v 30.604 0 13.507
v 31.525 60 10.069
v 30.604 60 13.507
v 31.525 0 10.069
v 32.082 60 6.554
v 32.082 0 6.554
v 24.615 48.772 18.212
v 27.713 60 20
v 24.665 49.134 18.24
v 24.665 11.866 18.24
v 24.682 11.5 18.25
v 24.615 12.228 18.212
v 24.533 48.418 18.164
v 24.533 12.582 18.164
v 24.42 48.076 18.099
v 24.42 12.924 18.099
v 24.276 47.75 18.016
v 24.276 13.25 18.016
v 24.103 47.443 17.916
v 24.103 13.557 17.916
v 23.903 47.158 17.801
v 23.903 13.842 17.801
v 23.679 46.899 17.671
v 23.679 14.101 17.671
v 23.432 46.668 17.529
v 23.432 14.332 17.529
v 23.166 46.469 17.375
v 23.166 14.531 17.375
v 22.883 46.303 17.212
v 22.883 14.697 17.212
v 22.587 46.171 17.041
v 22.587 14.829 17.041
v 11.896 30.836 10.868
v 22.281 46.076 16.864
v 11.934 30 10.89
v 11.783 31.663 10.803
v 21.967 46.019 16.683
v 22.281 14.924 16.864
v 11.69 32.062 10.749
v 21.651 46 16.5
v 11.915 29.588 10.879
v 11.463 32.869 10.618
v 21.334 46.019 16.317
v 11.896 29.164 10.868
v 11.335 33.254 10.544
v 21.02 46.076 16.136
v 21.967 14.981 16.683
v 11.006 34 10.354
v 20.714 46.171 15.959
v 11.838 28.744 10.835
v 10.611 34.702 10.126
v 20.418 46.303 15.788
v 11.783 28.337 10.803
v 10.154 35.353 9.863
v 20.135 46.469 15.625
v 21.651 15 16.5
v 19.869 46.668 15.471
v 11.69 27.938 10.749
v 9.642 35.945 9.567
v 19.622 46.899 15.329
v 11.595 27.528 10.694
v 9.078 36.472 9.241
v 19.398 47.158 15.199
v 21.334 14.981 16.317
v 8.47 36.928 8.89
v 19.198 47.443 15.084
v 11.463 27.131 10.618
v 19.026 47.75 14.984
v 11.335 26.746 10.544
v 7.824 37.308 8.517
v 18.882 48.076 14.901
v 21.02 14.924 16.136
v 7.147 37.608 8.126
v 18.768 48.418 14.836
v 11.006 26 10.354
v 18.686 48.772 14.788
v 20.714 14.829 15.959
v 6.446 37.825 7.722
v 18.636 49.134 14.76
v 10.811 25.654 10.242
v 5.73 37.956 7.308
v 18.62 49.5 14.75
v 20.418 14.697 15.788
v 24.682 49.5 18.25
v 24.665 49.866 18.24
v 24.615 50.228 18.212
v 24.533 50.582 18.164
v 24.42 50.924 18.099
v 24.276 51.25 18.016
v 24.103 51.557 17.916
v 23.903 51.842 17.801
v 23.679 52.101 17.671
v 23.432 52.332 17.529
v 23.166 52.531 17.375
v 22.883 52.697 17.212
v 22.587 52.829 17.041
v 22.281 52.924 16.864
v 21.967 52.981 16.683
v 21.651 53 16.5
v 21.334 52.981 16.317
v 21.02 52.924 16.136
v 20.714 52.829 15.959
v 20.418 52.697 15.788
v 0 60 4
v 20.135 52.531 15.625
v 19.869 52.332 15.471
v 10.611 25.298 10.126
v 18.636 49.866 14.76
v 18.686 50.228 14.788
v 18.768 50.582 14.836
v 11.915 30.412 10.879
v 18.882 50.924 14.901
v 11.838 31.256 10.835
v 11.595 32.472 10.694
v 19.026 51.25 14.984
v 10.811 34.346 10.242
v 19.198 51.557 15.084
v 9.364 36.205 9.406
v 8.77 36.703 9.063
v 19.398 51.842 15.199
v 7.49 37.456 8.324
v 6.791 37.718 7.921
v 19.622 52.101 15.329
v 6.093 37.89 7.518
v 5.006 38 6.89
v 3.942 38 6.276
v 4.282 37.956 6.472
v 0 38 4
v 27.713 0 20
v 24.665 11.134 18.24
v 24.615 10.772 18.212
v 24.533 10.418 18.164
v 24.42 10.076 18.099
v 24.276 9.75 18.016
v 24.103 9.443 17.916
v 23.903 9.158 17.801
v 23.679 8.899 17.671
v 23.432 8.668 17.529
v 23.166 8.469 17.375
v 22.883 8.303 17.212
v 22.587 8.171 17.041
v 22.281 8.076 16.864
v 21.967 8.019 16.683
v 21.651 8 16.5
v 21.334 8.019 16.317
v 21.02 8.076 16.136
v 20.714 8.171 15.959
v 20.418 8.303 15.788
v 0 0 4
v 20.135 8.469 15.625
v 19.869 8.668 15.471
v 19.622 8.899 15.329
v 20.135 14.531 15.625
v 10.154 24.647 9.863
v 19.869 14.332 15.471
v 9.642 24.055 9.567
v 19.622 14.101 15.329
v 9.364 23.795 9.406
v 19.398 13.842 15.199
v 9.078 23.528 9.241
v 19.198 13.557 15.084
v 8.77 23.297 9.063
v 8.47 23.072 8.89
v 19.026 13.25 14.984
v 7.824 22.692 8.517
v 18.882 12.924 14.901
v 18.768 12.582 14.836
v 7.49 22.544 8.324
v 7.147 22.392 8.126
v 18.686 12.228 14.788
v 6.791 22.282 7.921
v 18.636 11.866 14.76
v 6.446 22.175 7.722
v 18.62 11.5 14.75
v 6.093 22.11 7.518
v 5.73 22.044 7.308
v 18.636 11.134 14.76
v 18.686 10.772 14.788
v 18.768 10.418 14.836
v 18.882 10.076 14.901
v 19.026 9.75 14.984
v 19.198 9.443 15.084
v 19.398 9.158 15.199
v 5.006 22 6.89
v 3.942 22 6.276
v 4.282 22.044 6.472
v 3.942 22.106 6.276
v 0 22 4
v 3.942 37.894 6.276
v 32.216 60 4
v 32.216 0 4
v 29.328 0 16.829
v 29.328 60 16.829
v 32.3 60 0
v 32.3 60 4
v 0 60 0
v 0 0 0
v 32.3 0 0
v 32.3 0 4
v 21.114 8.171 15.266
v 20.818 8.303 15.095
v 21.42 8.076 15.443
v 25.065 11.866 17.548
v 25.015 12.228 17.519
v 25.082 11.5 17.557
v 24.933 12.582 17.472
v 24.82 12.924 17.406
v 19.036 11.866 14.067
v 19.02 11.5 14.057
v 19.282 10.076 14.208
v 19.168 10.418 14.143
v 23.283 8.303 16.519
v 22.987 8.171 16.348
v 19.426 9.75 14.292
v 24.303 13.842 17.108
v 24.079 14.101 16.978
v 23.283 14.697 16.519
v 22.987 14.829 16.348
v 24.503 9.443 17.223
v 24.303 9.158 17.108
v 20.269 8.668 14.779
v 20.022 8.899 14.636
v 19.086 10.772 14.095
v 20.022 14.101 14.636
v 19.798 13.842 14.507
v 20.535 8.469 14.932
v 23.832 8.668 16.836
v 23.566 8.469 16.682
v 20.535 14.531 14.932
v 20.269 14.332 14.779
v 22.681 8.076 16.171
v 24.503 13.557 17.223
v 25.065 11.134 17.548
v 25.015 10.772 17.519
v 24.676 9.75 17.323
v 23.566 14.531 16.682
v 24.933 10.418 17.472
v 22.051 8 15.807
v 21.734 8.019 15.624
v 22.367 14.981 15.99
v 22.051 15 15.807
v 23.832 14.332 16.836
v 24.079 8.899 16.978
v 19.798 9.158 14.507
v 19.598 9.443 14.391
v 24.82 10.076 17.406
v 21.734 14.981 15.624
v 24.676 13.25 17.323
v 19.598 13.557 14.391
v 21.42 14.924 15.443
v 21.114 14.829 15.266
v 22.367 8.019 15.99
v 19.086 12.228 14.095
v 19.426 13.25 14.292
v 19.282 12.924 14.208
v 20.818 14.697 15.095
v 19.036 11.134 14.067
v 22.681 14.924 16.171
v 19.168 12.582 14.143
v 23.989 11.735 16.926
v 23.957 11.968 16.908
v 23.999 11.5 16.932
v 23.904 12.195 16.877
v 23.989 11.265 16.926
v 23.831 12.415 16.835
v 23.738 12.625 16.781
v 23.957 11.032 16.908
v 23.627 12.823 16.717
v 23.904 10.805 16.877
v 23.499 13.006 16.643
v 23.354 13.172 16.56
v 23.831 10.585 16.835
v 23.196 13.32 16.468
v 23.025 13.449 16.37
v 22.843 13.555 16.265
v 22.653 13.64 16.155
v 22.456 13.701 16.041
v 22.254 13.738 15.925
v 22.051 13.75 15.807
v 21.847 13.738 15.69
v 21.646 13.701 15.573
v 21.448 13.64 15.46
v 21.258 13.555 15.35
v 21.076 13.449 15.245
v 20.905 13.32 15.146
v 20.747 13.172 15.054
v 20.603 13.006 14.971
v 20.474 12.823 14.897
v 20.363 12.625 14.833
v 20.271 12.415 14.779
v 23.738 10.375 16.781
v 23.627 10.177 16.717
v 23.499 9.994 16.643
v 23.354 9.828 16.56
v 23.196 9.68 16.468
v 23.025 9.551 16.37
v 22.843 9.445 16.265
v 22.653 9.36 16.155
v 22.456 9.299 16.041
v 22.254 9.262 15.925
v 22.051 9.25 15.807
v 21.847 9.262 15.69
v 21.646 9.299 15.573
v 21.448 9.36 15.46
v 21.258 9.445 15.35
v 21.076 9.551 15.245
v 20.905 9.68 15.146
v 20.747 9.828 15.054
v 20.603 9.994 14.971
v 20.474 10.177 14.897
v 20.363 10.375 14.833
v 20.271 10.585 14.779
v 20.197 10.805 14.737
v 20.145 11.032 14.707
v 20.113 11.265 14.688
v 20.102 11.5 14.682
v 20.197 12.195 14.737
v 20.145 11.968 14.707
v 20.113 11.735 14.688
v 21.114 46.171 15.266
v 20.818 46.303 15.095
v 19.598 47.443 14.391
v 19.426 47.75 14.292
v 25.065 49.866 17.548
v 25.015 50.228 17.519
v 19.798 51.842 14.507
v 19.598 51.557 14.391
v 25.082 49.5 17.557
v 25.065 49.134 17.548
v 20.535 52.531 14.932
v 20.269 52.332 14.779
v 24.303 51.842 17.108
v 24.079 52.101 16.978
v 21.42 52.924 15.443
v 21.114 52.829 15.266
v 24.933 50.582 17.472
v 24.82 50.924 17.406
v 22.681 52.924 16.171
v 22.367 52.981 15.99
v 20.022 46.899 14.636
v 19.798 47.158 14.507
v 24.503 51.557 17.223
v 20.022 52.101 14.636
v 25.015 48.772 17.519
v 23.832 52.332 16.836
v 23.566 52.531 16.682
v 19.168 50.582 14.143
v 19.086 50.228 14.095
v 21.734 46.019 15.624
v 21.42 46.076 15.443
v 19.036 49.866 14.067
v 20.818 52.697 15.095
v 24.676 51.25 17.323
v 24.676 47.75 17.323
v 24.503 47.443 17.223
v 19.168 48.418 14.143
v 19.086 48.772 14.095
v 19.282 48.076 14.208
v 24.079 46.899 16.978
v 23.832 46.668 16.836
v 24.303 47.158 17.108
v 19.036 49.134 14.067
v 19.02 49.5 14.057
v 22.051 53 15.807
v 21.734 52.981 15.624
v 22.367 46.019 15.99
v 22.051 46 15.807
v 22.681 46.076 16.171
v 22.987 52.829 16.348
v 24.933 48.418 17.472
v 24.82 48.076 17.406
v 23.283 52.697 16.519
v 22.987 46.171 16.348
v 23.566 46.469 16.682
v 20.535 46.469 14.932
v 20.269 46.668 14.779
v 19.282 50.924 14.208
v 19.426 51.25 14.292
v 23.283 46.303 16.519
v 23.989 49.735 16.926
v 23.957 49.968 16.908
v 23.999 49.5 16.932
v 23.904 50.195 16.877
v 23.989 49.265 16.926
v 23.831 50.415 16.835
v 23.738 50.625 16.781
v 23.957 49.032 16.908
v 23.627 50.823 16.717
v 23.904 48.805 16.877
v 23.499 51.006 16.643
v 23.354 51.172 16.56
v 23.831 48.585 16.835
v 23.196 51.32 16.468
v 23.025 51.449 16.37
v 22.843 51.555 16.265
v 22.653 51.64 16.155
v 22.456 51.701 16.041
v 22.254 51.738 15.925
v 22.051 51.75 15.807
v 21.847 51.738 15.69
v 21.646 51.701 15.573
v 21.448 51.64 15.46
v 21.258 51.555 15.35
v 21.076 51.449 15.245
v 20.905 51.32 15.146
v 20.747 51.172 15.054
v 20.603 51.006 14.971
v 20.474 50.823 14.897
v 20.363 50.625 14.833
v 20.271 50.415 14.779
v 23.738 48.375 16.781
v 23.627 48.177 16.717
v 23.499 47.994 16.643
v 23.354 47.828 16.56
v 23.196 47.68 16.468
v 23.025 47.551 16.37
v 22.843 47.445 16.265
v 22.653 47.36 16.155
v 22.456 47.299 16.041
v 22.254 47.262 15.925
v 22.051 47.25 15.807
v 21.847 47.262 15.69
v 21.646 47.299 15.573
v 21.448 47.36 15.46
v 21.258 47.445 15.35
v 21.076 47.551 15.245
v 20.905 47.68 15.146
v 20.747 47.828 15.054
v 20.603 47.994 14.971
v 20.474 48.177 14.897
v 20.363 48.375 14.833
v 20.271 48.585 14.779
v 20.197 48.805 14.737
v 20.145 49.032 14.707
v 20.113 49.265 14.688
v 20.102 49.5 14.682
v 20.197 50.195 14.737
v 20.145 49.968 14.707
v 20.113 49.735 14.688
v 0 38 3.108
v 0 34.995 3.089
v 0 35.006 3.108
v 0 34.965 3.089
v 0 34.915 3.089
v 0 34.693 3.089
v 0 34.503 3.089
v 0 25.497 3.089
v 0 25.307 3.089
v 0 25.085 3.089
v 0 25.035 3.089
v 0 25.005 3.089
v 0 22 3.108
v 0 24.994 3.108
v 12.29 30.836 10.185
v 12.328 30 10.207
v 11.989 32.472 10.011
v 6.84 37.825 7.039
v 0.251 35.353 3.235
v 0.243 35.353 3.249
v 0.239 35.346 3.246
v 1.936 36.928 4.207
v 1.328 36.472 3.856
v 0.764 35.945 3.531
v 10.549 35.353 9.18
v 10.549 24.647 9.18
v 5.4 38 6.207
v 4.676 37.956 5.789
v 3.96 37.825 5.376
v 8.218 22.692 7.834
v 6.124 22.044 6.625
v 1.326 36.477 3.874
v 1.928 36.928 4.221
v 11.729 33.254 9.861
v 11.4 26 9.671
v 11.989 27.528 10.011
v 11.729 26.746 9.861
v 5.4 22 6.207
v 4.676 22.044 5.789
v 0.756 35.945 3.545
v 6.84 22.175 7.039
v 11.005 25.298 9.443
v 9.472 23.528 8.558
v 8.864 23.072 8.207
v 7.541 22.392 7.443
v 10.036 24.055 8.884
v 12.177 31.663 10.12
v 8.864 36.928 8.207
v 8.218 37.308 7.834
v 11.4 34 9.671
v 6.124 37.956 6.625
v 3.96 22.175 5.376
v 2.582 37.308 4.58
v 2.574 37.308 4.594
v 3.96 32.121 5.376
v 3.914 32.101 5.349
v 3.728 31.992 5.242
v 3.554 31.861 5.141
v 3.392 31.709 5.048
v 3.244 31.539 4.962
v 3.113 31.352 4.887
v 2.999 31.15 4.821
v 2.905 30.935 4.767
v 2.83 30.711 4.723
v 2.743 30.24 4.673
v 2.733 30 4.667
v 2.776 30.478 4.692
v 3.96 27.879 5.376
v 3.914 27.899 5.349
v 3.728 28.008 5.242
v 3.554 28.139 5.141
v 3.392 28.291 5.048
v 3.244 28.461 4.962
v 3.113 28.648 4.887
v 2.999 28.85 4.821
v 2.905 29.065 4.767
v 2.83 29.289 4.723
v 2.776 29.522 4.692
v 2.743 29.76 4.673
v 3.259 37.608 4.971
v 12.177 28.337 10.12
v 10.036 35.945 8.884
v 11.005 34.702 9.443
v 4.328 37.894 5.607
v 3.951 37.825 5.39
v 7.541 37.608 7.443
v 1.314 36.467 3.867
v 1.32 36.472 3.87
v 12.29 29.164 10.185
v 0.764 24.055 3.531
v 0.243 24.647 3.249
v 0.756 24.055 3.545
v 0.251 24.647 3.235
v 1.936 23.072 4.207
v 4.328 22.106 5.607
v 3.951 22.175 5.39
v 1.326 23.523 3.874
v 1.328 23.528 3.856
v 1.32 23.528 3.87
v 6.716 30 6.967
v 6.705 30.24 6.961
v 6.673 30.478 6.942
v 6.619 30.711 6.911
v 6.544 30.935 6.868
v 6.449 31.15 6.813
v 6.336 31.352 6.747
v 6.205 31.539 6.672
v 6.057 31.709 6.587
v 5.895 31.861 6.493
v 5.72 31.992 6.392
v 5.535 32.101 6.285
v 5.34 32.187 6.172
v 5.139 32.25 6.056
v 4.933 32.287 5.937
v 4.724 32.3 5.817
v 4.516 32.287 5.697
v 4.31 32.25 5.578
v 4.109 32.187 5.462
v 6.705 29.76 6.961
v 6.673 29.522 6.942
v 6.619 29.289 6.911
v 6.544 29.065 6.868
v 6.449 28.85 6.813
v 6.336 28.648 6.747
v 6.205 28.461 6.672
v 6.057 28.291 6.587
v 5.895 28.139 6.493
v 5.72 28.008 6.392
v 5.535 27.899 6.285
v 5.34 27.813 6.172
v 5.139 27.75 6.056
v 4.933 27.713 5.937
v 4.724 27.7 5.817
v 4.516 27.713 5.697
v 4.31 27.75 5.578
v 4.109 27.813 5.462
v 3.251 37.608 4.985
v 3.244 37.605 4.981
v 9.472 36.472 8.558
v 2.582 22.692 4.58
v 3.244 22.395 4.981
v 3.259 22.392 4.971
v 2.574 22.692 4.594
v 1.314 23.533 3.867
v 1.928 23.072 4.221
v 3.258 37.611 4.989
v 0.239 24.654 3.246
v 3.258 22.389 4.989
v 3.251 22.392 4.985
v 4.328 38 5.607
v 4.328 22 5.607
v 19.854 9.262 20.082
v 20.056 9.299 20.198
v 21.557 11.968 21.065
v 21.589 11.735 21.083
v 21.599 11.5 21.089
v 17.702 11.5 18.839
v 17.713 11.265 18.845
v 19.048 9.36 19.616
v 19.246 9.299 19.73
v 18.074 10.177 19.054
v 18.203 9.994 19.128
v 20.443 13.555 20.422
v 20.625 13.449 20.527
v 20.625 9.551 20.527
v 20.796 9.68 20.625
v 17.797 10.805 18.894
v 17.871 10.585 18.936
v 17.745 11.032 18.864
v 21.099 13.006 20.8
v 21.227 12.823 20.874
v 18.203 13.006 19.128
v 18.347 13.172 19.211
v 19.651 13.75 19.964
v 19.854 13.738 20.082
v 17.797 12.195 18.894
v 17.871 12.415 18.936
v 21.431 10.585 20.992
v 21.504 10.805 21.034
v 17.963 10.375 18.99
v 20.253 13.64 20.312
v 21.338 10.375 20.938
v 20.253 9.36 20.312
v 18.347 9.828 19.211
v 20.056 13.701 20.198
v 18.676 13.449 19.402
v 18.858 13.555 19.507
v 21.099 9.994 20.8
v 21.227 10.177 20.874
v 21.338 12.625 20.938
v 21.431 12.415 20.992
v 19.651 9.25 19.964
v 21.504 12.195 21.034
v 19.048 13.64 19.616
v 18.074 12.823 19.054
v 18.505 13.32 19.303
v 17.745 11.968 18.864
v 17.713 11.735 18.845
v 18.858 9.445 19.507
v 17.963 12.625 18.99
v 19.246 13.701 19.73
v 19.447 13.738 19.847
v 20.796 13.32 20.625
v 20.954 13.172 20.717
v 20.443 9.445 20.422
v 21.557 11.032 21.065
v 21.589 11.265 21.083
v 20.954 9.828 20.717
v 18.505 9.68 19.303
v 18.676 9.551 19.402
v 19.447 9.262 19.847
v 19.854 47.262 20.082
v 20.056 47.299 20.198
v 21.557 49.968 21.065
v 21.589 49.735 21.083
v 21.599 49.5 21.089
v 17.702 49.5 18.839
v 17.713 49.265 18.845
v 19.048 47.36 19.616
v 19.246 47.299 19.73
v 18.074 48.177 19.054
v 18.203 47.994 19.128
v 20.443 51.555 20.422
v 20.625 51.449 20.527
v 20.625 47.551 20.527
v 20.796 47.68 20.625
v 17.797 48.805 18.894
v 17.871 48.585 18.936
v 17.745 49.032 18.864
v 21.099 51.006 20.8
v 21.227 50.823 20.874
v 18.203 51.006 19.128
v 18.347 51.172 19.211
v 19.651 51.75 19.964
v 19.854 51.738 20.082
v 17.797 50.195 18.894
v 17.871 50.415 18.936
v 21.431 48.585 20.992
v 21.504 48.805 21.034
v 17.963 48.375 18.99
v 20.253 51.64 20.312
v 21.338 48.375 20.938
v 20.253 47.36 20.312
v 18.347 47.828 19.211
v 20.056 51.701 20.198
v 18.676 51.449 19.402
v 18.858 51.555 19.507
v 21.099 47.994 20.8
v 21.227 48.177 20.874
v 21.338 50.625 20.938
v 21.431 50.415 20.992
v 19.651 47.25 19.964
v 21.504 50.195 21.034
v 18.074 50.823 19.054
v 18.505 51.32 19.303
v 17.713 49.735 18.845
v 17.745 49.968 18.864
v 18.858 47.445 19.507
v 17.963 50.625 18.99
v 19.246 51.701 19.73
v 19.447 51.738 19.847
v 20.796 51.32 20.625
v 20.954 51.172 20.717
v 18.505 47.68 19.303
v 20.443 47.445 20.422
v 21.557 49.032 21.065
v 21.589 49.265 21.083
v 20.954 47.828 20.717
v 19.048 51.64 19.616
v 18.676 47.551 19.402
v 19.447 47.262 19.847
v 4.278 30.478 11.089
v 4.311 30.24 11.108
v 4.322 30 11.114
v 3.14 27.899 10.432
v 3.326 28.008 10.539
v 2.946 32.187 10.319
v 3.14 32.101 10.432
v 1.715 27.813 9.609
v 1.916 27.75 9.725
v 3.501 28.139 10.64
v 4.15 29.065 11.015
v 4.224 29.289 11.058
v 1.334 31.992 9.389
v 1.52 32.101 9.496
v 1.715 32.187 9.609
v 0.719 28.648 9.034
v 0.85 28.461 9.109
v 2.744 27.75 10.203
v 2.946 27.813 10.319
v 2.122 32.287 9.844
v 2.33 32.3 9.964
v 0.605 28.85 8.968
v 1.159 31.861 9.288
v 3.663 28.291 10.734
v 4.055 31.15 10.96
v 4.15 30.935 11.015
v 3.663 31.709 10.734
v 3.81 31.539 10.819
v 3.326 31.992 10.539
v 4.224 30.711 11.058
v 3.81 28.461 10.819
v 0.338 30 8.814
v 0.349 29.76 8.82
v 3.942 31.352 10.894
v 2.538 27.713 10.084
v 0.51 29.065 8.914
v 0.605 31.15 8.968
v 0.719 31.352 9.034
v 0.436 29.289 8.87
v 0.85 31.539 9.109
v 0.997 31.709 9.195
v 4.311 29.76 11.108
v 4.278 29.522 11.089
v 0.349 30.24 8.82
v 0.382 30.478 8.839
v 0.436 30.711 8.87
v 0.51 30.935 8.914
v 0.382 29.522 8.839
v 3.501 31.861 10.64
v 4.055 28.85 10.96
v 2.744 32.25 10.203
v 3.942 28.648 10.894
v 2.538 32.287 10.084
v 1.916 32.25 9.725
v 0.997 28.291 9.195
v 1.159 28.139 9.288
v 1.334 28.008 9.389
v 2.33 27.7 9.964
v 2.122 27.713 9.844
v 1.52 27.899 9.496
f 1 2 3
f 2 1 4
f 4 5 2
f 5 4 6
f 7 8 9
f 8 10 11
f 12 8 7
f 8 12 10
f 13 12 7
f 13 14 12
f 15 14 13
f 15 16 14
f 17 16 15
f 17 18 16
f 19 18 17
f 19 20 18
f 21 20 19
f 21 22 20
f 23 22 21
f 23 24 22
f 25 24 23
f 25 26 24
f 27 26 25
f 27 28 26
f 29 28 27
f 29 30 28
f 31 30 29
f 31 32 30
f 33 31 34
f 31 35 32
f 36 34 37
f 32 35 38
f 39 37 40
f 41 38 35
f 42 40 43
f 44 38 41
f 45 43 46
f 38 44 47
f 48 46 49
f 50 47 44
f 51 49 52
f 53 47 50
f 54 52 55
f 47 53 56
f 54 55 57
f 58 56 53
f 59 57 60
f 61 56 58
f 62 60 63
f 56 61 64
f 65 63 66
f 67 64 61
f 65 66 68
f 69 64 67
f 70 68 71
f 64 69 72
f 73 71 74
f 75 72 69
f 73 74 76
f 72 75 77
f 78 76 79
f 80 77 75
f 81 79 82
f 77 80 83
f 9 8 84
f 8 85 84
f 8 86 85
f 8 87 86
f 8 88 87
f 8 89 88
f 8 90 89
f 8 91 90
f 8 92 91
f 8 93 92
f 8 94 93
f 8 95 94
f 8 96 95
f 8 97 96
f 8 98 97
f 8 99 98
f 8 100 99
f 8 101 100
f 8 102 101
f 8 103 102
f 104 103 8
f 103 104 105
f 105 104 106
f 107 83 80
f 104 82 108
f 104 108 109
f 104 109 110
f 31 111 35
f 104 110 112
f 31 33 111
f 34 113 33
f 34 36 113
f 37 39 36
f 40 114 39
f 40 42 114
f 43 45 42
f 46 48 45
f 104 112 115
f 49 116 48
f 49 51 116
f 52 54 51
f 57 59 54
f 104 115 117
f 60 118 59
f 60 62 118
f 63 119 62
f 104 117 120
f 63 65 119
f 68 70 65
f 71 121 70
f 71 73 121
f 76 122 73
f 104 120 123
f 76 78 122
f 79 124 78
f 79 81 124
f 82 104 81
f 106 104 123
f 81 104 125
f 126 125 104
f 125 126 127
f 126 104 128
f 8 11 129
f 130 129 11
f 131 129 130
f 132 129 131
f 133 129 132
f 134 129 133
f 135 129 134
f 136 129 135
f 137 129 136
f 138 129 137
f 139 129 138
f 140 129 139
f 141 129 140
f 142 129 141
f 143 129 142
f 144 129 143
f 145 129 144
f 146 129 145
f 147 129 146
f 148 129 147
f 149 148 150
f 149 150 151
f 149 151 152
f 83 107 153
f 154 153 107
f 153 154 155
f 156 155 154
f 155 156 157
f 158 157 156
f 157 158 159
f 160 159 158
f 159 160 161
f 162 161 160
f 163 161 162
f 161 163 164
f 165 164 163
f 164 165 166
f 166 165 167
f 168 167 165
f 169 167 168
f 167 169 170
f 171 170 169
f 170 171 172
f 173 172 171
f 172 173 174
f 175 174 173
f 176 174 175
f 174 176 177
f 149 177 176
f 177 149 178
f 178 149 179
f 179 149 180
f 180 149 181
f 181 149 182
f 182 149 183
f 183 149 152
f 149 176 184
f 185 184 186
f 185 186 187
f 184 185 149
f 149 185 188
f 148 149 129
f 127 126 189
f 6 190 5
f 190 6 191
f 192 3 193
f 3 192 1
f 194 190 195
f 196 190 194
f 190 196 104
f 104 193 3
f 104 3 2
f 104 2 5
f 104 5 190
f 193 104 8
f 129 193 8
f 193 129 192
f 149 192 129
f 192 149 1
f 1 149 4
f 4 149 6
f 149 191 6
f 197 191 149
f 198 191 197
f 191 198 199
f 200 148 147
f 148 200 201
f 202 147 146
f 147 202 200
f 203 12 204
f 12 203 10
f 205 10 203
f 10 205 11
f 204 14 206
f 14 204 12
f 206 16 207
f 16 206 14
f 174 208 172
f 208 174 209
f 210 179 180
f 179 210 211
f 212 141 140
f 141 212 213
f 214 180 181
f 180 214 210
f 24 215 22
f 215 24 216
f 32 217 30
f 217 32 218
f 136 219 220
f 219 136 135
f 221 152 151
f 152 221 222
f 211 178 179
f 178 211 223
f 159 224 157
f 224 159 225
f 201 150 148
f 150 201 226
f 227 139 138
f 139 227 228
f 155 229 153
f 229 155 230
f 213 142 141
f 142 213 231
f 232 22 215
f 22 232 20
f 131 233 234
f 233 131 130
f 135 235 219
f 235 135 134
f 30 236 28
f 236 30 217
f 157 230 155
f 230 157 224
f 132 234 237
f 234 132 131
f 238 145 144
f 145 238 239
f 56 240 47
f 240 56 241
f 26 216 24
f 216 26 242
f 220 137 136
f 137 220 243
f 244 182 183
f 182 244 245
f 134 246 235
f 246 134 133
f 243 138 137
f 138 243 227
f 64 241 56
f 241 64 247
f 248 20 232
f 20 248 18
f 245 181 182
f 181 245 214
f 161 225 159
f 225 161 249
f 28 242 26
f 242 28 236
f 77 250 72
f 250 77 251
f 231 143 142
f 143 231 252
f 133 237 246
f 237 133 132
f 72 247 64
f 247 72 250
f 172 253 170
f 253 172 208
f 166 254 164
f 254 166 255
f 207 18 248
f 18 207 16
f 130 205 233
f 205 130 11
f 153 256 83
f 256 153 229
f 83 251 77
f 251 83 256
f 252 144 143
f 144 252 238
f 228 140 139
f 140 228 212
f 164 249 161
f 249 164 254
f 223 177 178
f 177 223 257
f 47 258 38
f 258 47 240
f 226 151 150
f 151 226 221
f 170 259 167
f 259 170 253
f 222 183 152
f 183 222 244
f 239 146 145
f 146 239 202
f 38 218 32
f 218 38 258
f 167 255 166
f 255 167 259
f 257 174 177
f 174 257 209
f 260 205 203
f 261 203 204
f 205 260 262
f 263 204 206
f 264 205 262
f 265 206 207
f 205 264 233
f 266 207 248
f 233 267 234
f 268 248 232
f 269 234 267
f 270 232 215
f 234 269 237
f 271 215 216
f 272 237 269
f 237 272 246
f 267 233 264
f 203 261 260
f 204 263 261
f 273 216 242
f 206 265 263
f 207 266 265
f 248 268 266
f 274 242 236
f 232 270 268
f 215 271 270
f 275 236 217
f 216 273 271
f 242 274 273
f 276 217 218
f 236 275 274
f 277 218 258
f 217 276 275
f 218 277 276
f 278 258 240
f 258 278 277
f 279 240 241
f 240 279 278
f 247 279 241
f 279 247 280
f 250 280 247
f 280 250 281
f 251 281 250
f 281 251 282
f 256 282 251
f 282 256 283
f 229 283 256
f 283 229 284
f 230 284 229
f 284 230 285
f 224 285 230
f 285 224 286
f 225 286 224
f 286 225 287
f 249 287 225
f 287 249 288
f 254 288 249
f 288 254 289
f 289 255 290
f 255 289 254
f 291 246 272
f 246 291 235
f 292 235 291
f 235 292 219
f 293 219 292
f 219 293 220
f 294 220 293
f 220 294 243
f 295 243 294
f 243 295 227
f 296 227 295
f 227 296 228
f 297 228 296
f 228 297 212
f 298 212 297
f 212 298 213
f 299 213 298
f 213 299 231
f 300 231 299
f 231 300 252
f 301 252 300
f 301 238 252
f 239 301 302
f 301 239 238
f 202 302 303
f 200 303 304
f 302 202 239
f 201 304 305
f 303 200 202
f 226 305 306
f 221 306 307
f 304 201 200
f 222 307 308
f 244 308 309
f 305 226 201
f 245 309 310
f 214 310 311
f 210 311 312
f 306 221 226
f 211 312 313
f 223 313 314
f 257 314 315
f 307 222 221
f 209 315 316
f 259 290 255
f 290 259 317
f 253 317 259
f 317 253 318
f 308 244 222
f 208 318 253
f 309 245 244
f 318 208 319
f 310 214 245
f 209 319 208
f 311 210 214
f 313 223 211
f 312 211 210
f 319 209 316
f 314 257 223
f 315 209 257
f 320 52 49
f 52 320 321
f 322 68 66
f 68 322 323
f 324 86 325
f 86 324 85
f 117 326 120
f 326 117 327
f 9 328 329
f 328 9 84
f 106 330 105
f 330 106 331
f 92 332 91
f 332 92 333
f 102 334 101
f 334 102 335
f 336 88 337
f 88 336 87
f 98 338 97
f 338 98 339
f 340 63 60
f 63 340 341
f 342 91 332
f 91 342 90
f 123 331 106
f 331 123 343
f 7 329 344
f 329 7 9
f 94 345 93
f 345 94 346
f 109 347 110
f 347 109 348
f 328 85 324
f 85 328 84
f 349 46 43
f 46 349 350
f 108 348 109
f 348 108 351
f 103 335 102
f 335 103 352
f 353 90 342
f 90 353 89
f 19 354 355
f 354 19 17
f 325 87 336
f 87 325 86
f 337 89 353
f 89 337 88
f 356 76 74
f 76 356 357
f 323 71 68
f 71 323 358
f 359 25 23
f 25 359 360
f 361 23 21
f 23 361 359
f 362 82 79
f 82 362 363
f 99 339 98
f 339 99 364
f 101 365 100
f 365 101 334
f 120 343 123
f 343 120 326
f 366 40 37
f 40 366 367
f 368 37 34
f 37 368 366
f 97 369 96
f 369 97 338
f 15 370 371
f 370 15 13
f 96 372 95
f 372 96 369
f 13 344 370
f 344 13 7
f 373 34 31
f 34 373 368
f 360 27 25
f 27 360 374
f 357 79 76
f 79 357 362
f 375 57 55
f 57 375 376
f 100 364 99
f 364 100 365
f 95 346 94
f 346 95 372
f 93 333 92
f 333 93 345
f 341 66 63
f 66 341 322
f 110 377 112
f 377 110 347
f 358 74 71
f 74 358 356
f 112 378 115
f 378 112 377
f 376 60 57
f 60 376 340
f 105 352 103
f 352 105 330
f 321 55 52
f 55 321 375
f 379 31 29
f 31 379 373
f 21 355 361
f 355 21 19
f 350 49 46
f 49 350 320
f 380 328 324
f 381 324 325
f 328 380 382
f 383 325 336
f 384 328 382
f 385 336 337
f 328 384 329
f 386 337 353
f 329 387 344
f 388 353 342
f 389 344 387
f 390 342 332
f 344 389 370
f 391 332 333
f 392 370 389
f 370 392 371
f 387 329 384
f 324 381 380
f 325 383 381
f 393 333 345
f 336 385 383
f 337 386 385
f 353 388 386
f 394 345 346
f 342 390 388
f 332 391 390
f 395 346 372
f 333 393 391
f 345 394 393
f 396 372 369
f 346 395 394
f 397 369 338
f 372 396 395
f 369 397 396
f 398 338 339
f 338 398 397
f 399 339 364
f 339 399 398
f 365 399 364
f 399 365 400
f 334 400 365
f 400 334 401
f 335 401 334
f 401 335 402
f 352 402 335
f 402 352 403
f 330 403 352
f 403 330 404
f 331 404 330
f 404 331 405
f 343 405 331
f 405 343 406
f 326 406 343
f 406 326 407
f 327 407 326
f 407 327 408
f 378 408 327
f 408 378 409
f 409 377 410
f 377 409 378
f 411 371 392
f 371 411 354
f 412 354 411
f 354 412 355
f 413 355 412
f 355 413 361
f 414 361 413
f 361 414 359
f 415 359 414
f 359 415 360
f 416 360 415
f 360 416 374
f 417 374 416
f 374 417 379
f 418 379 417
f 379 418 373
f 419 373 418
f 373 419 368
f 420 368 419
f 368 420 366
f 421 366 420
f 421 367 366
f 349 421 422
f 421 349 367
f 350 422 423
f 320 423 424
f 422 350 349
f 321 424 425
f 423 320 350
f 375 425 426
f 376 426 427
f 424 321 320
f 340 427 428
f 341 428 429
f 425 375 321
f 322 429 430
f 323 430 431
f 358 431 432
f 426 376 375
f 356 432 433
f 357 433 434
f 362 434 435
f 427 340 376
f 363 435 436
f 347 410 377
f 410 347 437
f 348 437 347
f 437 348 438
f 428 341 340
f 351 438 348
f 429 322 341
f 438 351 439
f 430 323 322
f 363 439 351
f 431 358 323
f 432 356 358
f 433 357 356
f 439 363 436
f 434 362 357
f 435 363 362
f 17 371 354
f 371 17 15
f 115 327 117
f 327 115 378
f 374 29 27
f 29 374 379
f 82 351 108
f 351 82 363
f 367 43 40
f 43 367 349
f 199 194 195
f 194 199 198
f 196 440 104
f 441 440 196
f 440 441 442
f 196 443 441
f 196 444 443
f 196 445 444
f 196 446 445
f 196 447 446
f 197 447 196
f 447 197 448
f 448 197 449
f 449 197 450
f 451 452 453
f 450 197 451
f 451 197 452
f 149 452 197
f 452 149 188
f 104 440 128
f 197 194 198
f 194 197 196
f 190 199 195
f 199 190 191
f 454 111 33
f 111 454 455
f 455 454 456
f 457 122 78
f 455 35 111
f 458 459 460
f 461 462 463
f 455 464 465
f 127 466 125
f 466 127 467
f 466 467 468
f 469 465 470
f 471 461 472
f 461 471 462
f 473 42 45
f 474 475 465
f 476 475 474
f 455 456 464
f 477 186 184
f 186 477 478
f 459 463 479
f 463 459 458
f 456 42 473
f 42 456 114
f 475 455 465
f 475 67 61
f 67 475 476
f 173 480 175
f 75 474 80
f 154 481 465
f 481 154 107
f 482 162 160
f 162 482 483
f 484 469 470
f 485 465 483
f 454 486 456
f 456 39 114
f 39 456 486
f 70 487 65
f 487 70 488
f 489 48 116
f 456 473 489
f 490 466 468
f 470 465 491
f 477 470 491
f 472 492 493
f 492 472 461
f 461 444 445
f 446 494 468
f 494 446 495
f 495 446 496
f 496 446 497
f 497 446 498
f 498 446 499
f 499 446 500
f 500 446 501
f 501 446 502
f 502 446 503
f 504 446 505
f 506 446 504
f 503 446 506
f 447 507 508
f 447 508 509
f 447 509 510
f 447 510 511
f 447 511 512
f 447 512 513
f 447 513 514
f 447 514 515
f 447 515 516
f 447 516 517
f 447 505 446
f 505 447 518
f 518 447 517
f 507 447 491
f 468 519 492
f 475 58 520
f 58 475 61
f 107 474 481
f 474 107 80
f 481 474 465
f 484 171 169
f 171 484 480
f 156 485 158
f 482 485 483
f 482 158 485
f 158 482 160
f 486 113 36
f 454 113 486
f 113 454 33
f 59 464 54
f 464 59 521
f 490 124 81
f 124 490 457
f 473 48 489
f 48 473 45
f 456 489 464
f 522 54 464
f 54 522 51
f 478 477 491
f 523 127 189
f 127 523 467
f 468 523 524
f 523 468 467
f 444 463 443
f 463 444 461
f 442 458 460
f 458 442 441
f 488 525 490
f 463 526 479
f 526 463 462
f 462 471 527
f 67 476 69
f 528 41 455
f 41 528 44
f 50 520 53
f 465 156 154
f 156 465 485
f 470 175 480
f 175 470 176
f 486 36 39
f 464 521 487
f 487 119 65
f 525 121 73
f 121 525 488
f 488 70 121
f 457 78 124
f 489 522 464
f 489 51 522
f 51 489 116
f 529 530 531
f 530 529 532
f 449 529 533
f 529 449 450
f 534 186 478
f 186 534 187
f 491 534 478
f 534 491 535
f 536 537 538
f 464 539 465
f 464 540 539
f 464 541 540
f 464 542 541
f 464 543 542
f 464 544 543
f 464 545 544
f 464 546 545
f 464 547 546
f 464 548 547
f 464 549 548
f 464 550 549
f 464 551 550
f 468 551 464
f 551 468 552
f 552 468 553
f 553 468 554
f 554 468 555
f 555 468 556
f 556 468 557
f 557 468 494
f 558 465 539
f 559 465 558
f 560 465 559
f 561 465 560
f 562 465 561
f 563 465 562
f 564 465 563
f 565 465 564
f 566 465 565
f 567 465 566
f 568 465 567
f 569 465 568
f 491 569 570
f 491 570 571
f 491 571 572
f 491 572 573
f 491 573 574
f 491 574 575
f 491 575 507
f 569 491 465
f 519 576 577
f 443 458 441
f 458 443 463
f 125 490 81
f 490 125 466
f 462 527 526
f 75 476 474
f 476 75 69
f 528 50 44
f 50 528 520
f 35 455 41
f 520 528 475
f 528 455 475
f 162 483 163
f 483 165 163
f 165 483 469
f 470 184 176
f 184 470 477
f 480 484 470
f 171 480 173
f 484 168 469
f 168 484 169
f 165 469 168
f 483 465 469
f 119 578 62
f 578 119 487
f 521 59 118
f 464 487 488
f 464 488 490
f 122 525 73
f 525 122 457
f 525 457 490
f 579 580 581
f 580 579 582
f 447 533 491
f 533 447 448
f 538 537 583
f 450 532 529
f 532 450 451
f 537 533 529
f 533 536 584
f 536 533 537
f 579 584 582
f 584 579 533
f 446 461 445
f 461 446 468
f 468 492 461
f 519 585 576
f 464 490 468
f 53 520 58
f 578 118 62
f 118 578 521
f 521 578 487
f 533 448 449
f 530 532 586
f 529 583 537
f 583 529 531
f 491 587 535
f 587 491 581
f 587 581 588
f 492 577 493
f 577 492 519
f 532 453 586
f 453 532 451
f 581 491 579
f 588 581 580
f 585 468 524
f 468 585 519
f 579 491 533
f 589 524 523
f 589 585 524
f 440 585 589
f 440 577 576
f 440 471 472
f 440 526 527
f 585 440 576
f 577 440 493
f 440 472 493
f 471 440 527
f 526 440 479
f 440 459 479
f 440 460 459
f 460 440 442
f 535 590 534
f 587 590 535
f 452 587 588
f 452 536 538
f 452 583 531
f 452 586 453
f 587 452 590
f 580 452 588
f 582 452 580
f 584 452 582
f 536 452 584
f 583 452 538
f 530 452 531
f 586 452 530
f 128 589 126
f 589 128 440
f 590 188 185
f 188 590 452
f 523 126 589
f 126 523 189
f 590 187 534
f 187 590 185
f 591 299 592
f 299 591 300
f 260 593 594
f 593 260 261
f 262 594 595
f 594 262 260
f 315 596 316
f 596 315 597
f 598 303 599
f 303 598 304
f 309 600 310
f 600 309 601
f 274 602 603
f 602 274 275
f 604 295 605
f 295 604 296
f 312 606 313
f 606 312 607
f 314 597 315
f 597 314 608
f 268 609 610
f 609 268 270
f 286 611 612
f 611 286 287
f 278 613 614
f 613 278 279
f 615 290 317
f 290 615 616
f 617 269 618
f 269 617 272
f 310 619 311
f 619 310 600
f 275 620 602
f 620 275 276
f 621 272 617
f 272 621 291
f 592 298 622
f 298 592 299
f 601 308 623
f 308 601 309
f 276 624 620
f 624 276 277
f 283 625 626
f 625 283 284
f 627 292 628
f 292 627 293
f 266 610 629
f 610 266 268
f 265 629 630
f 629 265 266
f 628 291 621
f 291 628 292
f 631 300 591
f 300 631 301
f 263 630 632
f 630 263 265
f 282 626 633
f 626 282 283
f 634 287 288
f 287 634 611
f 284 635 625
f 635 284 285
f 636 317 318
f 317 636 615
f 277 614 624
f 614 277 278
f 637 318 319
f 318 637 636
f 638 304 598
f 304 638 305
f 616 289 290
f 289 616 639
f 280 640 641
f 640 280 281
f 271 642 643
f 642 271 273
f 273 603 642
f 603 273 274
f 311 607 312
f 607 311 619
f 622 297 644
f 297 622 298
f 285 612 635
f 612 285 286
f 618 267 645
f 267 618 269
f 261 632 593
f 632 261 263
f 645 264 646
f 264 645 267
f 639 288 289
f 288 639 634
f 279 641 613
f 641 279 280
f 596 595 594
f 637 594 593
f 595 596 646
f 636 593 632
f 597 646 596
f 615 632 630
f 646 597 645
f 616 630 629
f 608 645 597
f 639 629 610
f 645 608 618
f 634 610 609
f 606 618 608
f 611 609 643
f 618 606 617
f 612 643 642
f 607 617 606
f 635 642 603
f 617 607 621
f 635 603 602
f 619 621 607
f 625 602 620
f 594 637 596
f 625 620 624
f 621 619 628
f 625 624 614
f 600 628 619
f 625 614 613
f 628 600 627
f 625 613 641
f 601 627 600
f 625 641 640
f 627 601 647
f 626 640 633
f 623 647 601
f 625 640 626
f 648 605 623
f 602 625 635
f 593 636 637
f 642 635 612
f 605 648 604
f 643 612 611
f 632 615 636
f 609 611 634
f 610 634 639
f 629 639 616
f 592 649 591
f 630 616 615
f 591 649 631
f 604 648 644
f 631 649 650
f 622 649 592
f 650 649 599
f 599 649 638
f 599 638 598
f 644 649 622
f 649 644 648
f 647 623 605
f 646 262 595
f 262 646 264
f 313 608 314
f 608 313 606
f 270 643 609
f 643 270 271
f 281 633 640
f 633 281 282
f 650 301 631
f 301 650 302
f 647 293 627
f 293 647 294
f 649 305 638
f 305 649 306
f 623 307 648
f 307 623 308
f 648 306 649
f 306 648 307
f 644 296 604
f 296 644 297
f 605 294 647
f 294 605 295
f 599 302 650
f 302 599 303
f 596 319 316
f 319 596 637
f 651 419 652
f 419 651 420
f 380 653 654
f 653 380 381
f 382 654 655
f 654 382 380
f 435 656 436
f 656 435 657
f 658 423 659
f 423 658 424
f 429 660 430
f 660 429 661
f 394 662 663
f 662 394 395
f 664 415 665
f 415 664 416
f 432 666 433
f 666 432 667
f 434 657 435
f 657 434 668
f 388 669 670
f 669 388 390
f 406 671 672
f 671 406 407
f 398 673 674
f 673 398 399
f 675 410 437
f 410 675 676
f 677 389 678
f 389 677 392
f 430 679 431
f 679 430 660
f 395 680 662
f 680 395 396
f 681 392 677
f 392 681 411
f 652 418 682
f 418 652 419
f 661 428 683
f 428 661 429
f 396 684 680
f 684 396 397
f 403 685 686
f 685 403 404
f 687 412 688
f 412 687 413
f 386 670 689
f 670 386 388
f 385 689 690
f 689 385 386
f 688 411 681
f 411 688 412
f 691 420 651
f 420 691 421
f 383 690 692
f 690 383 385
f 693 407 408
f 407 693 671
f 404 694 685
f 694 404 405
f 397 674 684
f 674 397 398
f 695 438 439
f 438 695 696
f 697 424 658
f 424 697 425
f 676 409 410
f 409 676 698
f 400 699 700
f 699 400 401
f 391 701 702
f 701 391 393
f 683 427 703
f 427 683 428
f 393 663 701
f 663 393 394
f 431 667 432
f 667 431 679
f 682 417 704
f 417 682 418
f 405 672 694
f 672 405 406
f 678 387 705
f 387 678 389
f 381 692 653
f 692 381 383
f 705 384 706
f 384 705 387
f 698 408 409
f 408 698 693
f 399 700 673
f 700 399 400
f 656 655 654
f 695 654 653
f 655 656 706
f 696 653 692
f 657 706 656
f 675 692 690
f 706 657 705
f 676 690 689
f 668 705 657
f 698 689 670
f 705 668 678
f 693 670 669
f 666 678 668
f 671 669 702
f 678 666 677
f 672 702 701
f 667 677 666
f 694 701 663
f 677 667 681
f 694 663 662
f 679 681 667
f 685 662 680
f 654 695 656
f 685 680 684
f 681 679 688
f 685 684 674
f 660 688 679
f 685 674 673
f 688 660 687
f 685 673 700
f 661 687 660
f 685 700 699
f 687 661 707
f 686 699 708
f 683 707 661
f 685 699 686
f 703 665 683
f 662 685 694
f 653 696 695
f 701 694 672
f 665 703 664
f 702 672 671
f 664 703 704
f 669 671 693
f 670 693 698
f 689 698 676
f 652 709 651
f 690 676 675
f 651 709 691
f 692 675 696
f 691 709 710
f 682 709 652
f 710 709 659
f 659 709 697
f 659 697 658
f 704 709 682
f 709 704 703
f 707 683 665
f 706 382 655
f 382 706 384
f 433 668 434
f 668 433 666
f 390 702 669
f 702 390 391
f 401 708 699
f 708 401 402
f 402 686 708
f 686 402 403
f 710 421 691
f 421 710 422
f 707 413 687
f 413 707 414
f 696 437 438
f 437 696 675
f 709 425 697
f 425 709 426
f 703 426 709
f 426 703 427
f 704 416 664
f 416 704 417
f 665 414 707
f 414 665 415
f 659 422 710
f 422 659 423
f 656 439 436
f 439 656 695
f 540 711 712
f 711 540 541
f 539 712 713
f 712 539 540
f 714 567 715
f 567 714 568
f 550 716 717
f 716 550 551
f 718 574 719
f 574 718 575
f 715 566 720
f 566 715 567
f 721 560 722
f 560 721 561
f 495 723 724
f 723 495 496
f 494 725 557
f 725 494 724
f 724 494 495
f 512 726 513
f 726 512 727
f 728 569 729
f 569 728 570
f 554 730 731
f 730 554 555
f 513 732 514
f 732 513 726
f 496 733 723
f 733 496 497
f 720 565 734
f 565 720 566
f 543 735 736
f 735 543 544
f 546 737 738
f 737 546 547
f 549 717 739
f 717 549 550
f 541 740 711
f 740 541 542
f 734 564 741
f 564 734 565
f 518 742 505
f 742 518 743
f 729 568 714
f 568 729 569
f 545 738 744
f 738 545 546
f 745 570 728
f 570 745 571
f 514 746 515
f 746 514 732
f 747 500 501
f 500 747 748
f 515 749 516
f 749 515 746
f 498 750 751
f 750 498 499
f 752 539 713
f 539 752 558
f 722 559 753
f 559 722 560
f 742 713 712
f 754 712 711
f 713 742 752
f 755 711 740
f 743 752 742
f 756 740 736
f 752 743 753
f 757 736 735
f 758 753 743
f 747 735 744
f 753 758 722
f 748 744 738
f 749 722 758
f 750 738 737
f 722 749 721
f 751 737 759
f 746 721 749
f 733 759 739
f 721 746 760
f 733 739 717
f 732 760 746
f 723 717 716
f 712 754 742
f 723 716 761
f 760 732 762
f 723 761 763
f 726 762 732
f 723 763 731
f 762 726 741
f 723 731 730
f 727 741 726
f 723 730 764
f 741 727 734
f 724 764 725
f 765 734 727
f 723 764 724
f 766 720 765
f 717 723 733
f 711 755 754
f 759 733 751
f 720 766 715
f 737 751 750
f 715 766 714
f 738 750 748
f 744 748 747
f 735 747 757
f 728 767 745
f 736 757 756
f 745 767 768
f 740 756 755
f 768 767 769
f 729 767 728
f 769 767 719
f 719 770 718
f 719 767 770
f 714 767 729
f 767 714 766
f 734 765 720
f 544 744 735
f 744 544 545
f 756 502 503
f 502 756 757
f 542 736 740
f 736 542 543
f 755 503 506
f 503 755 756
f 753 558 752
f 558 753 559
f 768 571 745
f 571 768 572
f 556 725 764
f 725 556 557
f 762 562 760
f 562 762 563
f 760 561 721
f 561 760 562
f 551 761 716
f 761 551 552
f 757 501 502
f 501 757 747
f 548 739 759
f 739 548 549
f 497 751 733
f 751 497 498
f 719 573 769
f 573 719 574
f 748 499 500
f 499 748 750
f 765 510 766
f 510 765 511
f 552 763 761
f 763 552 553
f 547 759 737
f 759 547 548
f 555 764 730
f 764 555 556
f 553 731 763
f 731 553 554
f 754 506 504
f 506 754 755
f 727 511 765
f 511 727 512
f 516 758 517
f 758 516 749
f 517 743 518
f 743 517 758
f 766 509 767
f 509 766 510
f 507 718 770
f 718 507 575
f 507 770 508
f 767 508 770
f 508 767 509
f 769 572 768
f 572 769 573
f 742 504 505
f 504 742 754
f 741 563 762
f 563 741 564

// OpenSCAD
$fn=60;
callsign="";

translate ([0, 0, 4]) rotate([-90, 0, 0]){
    difference() {
        union() {
        rotate([0, 0, -30]) {
            difference(){
                translate([-2, 0, 0]) rotate_extrude(angle=30) square(size=[34, 60]);
                translate([-4, -2, -2])cube([4, 4, 64]);
                translate([25, 0, 11.5]) rotate([90,0,0]) cylinder(r=3.5, h=1.6, center=true);
                translate([25, 0, 49.5]) rotate([90,0,0]) cylinder(r=3.5, h=1.6, center=true);
                rotate([0, 270, 200]) translate([30, 0, 30.5])  
                    linear_extrude(2) text(callsign, valign="center", halign="center");
                }
            }
        cube([32.3, 4, 60]);
        }
    translate([5, -2.9, 30]) rotate([90,0,-30]) cylinder(r=8.0, h=1.6, center=true);
    translate([-3, 1.7, 30]) rotate([90,0,-30]) cube([16, 16, 1.6], center=true);
    }
}
translate ([0, 0, 4]) rotate([-90, 0, 0]){
        rotate([0, 0, -30]) {
            translate([25, 0, 11.5]) rotate([90,0,0]) cylinder(r=2.25, h=8, center=true);
            translate([25, 0, 49.5]) rotate([90,0,0]) cylinder(r=2.25, h=8, center=true);
            translate([5, -1, 30]) rotate([90,0,0]) cylinder(r=2.30, h=6, center=true);
        }
}
